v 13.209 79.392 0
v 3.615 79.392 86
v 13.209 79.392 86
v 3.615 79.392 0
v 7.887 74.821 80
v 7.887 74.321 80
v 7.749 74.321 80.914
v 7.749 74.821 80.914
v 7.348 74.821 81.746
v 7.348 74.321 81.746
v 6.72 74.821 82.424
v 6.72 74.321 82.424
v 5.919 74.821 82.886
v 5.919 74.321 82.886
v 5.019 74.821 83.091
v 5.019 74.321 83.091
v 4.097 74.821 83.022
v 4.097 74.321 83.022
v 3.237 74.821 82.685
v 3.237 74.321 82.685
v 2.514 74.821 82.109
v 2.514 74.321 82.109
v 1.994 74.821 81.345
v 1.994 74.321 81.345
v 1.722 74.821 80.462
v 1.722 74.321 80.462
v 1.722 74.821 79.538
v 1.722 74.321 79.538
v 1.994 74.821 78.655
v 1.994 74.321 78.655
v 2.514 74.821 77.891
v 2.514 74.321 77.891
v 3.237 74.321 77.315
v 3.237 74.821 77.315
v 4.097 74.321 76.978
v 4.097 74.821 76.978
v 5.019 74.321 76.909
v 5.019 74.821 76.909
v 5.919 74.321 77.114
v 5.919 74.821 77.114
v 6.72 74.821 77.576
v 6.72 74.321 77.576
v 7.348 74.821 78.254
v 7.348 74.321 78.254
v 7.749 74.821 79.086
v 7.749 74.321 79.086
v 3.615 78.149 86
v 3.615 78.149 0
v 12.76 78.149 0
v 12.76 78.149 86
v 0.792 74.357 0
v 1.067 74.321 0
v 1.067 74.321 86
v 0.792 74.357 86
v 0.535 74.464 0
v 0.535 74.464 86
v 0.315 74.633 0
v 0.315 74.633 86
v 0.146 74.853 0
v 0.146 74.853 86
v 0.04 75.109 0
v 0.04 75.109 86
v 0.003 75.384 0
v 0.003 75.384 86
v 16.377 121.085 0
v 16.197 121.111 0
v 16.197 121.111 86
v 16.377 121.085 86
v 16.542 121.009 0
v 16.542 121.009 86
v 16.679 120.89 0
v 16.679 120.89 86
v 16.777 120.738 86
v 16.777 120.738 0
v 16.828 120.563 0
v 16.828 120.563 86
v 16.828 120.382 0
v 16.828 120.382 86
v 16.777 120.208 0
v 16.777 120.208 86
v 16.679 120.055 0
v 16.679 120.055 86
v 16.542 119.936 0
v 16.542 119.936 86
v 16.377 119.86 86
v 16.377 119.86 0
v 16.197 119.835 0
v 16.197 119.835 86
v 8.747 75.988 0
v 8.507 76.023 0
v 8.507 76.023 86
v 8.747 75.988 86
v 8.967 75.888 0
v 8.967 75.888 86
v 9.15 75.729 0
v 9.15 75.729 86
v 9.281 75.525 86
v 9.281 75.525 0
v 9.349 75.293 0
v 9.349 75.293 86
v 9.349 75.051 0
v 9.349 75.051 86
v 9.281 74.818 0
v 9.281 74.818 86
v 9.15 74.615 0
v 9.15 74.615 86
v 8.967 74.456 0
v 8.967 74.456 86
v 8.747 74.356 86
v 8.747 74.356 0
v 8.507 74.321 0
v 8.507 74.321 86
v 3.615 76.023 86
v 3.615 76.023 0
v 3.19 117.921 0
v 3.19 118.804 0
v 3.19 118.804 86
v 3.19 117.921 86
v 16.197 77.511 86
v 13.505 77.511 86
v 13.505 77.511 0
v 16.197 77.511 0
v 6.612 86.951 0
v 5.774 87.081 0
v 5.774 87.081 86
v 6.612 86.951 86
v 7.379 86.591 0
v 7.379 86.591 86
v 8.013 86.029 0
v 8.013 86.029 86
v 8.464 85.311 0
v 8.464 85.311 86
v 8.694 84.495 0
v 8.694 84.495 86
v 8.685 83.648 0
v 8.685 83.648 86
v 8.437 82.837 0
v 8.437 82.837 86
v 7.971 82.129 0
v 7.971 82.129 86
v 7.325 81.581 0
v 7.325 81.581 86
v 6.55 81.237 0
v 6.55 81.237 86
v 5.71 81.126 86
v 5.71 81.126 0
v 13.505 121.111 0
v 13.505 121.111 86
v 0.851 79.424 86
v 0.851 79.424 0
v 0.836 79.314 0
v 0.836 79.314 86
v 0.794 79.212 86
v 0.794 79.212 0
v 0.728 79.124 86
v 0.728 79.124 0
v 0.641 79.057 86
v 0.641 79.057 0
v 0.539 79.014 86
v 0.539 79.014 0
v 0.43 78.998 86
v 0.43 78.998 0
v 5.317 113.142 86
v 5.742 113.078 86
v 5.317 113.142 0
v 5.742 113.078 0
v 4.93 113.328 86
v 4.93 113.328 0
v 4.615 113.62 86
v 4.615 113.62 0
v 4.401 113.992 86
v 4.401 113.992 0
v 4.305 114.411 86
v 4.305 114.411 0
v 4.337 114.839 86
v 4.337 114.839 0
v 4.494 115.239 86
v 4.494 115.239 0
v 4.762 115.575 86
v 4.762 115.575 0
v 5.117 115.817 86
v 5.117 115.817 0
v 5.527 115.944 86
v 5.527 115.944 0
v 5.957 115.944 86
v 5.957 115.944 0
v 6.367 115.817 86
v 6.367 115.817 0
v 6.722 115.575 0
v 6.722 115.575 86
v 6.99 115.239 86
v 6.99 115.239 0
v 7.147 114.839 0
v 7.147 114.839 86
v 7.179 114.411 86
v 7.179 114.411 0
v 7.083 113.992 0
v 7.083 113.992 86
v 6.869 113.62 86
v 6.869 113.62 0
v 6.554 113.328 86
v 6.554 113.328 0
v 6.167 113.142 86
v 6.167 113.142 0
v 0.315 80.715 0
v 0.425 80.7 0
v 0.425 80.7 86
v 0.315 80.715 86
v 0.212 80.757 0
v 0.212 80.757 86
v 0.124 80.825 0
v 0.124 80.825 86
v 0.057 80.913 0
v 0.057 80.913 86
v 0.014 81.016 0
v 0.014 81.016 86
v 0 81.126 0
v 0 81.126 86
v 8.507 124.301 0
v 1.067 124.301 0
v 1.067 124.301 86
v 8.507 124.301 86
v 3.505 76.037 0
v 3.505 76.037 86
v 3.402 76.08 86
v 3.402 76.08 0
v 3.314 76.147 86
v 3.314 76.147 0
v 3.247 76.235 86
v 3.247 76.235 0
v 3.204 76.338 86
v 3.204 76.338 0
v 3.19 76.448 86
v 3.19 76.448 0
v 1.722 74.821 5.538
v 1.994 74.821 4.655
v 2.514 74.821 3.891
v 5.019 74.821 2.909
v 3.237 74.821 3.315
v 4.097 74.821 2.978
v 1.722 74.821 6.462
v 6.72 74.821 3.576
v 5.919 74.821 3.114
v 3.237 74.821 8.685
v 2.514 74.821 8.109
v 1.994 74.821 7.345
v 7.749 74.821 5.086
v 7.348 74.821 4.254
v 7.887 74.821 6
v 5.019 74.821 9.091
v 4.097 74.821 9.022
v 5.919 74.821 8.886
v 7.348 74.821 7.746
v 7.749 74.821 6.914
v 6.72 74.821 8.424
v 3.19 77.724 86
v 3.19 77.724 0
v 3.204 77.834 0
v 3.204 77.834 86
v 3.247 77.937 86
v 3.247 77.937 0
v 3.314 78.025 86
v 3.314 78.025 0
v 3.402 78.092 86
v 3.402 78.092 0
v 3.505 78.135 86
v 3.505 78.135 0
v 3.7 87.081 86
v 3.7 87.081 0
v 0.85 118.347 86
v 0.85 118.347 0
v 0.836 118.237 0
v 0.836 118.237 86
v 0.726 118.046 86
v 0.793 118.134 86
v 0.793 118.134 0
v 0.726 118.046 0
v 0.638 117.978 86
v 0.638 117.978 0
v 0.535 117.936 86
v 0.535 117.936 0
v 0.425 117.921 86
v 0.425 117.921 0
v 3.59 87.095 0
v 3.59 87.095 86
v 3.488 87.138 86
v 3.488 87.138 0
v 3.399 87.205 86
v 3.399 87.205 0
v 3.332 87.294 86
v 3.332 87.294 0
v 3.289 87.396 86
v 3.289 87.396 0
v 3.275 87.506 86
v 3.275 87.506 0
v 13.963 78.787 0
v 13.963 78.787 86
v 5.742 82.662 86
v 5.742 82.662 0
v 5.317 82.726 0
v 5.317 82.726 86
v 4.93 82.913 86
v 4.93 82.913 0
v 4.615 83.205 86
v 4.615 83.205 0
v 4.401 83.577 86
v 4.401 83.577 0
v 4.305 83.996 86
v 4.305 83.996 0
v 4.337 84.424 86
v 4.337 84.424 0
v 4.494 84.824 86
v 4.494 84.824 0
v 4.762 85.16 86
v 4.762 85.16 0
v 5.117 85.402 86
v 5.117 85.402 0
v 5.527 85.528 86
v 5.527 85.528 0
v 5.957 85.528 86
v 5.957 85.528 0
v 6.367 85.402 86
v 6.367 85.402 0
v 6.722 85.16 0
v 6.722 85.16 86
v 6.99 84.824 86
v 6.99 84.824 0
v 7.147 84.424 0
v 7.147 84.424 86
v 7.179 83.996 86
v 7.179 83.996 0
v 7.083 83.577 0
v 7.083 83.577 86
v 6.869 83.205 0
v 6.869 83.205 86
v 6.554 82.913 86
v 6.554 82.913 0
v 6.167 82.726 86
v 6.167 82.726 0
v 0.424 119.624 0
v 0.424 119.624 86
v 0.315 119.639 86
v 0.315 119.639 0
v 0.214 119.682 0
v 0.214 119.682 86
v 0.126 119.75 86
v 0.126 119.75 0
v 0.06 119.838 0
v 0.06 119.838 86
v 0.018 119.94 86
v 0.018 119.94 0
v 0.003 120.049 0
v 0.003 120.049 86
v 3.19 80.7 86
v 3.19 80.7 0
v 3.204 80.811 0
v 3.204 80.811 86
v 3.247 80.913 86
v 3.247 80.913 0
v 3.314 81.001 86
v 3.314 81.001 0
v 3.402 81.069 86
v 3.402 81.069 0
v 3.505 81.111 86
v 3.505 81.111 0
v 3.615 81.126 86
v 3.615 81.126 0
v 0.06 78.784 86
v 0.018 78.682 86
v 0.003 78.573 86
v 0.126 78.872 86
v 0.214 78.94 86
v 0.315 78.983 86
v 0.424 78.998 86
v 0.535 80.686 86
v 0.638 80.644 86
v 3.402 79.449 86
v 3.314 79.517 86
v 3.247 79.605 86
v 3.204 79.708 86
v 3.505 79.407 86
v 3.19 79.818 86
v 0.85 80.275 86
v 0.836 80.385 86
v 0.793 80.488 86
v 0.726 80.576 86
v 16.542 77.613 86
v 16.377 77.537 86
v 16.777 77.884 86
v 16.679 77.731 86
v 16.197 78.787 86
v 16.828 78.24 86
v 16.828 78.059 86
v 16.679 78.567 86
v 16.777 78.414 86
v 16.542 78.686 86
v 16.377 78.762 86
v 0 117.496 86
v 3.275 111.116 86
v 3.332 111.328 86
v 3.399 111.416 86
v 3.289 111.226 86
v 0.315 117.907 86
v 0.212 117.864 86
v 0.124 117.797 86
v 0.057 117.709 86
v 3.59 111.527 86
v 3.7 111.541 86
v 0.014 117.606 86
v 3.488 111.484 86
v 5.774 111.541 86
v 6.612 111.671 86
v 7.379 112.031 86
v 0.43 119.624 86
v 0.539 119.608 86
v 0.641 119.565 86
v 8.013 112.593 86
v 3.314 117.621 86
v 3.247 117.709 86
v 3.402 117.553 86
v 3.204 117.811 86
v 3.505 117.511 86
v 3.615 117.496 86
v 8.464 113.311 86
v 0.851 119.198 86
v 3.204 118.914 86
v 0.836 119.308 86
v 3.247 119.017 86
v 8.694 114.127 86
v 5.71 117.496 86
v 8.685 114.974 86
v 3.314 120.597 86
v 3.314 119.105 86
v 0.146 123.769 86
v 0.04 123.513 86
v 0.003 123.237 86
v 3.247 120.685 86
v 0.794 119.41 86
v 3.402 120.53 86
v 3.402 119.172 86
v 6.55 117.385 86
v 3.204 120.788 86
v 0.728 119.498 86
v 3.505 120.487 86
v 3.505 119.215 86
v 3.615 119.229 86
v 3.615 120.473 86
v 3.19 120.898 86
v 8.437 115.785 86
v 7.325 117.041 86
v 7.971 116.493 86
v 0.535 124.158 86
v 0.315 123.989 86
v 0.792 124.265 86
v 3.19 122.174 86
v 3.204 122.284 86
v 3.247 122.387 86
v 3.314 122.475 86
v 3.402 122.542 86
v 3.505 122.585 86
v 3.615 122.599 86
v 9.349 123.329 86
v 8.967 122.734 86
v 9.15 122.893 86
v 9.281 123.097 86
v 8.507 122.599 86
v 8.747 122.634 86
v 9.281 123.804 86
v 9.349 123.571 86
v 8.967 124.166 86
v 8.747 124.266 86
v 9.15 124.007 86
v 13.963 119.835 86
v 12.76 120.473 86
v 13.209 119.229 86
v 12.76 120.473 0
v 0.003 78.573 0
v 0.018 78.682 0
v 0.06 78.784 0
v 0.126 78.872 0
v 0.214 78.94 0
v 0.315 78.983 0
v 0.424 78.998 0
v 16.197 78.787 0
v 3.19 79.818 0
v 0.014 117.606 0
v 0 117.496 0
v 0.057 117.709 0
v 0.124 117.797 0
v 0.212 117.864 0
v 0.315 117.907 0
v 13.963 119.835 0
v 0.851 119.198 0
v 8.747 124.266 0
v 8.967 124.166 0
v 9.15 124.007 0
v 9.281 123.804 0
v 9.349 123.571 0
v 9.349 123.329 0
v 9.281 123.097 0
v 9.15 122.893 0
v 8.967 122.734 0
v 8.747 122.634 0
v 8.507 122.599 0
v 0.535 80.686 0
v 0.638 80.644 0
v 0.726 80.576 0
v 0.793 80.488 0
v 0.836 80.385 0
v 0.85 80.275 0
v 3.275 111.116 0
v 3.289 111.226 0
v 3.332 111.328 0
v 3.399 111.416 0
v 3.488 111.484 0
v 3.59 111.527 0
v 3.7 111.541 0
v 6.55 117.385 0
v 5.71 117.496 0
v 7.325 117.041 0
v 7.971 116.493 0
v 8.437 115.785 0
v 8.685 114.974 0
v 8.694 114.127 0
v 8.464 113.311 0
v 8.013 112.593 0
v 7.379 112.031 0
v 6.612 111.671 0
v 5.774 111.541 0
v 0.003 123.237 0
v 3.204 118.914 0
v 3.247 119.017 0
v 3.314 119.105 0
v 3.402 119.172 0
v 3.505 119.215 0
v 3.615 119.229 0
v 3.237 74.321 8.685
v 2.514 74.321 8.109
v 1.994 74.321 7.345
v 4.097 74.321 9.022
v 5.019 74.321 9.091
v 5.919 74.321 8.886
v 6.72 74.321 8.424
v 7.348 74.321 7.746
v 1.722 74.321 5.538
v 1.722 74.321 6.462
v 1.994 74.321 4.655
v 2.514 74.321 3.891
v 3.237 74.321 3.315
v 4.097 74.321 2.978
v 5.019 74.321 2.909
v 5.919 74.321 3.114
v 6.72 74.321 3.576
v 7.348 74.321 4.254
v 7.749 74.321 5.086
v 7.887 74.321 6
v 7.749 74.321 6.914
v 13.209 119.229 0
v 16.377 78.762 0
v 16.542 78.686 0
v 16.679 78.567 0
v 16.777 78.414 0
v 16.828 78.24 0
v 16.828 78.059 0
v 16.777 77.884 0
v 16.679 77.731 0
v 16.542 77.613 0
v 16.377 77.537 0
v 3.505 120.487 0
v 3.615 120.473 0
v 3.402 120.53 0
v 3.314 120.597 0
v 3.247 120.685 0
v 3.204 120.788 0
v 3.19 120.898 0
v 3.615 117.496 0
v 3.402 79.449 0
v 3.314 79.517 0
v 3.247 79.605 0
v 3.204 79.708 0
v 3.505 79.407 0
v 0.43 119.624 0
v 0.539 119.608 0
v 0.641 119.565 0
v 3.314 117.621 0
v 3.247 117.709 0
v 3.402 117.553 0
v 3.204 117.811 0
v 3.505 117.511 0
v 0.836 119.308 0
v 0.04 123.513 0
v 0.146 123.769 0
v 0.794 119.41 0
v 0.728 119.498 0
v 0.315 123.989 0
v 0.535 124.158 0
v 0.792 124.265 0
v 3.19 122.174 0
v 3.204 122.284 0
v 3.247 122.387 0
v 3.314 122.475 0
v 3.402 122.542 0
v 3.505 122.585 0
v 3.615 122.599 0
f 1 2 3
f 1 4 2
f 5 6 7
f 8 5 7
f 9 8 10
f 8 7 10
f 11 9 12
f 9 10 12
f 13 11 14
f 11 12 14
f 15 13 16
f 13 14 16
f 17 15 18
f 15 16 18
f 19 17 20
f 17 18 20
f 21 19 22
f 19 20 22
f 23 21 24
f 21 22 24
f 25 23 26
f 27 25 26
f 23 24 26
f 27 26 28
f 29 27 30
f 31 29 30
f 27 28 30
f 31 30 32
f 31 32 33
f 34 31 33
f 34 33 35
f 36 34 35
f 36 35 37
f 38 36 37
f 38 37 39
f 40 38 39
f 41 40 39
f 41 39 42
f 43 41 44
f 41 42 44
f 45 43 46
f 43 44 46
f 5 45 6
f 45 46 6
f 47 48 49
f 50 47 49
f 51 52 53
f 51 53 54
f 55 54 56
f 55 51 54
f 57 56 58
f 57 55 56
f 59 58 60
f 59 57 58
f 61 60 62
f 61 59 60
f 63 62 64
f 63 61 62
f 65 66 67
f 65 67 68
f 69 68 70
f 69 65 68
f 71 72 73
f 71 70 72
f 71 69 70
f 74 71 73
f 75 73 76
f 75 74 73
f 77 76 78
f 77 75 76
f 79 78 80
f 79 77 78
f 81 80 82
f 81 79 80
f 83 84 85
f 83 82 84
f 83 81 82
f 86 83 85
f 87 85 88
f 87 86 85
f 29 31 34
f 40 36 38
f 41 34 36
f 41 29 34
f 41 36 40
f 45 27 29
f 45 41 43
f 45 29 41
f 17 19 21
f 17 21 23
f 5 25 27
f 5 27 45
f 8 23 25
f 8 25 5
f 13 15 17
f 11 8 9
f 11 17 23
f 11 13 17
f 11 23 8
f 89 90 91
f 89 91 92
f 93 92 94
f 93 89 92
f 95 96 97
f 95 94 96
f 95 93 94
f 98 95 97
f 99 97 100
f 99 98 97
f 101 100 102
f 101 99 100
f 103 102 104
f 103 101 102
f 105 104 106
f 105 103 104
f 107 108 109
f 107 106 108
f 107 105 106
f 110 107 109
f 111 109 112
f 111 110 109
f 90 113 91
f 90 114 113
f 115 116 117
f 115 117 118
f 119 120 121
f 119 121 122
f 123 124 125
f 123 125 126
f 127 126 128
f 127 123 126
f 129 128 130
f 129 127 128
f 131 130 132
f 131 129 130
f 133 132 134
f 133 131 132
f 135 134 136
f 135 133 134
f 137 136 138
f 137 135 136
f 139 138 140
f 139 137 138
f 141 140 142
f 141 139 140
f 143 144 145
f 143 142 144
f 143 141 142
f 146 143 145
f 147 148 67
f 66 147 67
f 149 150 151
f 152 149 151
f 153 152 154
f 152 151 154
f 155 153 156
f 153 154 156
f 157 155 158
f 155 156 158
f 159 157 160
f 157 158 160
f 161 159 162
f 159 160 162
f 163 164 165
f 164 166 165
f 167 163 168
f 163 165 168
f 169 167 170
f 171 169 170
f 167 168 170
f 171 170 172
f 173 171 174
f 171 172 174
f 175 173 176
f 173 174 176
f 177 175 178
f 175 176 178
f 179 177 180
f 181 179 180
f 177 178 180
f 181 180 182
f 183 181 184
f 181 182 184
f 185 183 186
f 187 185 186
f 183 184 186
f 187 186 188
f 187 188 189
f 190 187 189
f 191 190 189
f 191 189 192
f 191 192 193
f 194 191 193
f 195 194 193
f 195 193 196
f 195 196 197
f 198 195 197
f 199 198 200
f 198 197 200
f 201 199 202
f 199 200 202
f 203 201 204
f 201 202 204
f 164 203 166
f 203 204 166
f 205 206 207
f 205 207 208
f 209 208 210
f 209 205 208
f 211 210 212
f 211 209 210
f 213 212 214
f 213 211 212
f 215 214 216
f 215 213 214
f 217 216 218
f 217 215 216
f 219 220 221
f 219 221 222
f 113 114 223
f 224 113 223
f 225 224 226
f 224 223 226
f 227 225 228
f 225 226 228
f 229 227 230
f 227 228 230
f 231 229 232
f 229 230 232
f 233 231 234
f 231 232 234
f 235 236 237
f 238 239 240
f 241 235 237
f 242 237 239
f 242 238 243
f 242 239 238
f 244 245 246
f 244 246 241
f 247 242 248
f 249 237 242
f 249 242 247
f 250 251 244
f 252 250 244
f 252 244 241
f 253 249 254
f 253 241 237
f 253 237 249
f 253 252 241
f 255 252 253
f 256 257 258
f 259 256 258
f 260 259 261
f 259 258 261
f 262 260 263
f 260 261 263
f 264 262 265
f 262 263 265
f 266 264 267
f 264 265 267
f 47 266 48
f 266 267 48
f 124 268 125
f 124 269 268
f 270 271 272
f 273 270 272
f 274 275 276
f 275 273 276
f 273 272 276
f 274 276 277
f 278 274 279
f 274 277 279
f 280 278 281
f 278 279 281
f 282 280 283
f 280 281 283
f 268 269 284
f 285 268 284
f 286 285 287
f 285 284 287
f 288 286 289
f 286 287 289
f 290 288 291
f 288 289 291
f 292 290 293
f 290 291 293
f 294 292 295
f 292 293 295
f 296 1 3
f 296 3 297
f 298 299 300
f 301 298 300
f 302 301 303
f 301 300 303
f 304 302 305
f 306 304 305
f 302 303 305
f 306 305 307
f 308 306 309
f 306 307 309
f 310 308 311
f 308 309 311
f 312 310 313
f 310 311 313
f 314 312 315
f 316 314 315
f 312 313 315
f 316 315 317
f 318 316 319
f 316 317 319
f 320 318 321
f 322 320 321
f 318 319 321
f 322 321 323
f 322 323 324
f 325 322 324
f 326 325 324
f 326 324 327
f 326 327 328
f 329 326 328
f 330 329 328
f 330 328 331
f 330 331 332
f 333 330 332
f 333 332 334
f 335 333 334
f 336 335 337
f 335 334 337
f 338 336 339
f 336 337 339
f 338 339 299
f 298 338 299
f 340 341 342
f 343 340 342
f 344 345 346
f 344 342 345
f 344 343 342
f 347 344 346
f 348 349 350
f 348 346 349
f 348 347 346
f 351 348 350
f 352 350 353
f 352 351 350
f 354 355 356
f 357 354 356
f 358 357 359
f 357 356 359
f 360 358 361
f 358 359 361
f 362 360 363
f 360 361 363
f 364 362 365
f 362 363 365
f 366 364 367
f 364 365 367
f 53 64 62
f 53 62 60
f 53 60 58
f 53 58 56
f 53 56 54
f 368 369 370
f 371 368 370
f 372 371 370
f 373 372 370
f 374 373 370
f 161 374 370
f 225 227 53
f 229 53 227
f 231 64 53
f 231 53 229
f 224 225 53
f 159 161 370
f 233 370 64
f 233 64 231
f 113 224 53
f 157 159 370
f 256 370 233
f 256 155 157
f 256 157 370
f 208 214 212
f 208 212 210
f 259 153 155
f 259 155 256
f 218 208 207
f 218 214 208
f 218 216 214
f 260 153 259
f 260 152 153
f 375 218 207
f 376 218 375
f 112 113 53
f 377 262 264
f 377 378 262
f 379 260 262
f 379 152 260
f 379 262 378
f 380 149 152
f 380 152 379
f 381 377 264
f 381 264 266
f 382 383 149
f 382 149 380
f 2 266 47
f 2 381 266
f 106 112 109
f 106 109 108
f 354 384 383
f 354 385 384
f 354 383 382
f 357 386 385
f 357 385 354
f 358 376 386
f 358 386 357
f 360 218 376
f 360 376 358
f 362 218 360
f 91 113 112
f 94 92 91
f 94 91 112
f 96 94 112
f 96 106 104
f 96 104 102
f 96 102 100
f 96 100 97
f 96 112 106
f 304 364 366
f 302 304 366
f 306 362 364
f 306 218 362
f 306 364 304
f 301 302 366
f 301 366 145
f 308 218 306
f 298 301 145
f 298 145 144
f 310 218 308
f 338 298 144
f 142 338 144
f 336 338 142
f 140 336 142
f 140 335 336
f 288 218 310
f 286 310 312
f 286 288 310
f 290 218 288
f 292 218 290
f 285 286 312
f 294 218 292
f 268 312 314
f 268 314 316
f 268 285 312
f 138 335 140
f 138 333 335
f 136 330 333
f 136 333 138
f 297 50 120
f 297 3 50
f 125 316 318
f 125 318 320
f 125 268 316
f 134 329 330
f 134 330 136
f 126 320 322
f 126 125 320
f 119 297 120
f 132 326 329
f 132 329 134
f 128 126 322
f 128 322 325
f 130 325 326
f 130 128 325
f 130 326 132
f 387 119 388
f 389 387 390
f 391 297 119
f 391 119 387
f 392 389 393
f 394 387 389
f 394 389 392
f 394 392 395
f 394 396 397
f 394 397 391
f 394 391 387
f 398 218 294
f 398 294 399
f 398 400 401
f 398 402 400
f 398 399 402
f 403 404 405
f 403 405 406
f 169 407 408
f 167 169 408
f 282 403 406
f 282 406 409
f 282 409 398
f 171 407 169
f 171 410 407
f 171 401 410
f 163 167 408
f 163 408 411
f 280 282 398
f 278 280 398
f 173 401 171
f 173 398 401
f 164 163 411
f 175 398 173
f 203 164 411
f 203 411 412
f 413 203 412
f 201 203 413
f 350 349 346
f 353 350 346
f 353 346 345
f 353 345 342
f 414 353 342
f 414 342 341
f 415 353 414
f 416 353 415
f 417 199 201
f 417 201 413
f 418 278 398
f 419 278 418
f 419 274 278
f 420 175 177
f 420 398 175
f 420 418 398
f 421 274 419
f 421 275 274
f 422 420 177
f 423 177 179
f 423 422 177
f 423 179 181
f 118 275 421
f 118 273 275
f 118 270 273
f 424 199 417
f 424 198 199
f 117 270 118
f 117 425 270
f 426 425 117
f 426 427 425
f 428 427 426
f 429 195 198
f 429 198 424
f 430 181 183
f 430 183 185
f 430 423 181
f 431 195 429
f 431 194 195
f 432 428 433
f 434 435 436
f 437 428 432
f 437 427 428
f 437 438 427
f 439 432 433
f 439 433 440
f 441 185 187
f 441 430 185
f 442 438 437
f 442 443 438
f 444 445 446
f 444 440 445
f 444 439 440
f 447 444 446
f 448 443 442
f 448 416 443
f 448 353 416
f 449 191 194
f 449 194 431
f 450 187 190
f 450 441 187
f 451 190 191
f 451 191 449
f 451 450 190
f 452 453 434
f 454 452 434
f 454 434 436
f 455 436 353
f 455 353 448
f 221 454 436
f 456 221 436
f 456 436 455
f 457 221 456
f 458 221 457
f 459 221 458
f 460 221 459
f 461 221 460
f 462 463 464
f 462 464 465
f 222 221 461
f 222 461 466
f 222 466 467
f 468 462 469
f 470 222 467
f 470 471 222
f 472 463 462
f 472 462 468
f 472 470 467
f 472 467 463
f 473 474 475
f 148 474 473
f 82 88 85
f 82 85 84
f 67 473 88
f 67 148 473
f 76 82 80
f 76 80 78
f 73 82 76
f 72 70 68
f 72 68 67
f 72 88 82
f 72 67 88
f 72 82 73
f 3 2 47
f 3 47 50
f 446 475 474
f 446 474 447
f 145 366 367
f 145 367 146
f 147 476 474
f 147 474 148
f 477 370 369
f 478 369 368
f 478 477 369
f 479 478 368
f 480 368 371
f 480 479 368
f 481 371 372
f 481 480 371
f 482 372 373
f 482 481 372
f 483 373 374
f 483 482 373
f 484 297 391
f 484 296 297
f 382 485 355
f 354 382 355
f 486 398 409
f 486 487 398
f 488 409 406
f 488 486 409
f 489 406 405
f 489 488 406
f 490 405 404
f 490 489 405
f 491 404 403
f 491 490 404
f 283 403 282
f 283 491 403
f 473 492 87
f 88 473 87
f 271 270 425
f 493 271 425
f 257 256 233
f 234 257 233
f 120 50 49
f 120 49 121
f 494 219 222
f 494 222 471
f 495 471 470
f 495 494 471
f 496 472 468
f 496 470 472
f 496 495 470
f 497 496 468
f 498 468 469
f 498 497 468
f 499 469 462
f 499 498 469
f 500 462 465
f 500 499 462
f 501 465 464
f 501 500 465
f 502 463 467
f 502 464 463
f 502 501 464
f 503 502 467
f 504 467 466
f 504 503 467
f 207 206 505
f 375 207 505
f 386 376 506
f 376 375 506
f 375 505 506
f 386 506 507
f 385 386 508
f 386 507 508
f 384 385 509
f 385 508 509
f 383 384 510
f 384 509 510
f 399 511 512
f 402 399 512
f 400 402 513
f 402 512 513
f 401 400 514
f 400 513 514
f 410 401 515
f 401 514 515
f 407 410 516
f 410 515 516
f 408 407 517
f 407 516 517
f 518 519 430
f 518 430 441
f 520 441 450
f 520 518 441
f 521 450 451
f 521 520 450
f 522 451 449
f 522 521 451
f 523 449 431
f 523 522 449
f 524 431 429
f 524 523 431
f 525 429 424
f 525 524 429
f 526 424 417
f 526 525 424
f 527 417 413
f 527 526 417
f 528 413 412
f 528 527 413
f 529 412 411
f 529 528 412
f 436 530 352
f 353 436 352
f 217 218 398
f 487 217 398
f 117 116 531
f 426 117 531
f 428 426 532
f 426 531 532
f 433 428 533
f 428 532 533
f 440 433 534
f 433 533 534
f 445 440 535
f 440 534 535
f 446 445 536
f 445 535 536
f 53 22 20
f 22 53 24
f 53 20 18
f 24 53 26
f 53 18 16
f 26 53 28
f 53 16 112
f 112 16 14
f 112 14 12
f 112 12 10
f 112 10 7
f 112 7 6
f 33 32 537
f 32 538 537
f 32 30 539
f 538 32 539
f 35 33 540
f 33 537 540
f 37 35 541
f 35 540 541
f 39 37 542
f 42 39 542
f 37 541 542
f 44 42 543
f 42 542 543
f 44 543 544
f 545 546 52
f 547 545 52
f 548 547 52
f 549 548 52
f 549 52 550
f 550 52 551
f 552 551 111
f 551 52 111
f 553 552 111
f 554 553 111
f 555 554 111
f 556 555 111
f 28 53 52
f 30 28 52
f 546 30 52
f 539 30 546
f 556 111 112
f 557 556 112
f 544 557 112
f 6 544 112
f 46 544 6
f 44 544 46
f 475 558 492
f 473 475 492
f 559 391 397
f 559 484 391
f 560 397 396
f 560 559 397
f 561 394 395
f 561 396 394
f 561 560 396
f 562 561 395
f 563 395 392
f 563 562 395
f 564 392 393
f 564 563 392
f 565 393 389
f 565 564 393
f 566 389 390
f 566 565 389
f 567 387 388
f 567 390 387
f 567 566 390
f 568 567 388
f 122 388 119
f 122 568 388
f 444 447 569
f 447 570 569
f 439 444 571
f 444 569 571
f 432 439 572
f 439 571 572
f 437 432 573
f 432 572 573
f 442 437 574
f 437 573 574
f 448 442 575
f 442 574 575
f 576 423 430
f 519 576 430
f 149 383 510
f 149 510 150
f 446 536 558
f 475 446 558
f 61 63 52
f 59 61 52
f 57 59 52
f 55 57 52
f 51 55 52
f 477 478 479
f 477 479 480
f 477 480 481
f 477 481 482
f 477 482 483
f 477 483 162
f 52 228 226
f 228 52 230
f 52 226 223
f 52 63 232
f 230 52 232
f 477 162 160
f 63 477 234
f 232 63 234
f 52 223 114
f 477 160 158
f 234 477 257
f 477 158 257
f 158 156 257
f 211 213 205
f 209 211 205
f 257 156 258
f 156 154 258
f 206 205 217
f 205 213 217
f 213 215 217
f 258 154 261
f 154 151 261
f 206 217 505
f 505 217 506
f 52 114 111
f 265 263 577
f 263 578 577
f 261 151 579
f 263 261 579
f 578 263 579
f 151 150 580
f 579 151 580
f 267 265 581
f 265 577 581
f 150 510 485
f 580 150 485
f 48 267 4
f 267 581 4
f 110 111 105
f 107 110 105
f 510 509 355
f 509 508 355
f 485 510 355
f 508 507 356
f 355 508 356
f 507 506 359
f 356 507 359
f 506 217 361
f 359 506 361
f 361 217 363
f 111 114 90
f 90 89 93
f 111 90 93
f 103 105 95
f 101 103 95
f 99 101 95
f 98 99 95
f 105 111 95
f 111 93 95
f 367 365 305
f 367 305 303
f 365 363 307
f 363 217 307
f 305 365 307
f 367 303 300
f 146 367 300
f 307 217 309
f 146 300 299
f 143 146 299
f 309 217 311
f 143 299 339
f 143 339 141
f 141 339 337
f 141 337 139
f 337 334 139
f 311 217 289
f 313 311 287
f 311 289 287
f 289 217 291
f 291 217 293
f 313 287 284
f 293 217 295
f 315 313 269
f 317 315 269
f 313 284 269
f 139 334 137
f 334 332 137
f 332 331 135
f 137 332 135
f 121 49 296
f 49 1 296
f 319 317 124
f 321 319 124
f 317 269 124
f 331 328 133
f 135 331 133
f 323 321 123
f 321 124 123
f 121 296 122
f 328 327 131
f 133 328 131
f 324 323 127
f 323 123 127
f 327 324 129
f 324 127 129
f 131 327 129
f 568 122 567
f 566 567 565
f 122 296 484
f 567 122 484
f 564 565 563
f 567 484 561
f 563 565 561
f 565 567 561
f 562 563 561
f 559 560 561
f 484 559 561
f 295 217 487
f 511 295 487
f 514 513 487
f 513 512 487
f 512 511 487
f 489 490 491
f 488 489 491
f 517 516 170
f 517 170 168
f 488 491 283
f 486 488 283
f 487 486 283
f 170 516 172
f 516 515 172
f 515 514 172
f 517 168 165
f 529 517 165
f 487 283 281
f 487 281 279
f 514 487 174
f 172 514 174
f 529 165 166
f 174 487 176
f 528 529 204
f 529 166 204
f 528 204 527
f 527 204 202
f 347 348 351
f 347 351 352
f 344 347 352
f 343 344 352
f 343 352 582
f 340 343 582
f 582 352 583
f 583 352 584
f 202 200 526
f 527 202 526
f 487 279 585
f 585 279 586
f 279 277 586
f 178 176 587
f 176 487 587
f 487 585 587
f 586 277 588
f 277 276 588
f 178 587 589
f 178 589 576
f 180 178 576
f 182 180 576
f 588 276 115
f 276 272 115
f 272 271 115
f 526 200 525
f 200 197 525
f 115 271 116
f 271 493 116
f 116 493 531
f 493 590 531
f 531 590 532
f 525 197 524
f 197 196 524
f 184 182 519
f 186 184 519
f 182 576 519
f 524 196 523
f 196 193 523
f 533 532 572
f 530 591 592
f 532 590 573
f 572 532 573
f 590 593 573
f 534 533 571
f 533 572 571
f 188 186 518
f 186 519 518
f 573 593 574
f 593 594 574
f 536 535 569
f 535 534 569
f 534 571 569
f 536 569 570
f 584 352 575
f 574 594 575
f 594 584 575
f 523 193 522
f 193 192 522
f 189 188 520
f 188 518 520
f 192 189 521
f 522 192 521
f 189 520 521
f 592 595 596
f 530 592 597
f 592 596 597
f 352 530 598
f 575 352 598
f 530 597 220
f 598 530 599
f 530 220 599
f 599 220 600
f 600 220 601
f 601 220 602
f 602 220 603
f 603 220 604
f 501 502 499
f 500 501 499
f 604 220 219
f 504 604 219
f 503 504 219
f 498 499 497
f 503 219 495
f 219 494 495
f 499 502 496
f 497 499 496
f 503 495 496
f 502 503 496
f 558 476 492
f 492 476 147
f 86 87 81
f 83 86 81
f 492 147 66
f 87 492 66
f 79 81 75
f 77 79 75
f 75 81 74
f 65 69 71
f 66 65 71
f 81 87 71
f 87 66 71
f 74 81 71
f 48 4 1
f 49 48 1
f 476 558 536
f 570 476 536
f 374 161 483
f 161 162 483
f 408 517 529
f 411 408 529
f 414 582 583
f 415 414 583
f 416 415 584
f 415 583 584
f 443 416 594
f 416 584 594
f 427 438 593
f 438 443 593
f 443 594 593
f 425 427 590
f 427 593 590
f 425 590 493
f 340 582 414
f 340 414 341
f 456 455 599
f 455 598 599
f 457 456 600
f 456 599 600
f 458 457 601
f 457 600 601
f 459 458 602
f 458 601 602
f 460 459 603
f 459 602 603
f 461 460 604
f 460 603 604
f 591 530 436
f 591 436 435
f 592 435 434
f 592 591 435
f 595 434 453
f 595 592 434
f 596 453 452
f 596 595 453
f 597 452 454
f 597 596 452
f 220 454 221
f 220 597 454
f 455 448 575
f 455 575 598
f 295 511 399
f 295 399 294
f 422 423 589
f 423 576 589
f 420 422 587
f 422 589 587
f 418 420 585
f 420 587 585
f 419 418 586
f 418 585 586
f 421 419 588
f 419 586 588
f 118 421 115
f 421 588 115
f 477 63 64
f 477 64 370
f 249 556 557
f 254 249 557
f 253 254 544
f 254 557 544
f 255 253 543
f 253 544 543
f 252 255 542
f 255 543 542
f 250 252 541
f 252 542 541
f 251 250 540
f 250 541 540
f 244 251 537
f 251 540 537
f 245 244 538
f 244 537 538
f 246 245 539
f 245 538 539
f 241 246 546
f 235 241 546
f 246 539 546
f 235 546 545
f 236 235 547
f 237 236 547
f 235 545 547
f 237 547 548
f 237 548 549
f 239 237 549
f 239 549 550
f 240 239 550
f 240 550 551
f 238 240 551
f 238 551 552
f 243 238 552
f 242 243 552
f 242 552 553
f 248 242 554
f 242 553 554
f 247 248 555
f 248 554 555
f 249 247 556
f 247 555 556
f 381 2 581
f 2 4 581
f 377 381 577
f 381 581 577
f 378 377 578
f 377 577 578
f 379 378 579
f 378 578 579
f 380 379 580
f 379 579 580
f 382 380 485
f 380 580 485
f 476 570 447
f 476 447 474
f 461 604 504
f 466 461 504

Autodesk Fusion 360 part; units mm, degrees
sketch "Sketch1" plane through (0, 0, 0) normal (0, 0, 1) x (1, 0, 0)
  line L0 (36.0187, 148.7477) -> (36.0366, 148.794)
  line L1 (65.6521, 184) -> (76.1579, 184)
  line L2 (14.9996, 189) -> (14.9996, 194.9997)
  line L3 (-0.0194, 154.2247) -> (-0.0004, 154.2001)
  line L4 (-0.0302, 138.7537) -> (-0.0004, 138.7058)
  line L5 (-0.0004, 81.3672) -> (-0.0021, 81.3657)
  line L6 (15.3997, 143.0047) -> (15.3997, 102.5015)
  line L7 (-0.0004, 173.0047) -> (-0.0004, 102.5015)
  line L8 (2.0223, 183.0092) -> (1.9964, 183.0092)
  line L9 (1.9996, 175.0047) -> (2.0001, 175.0047)
  line L10 (4.0001, 177.0042) -> (4.0009, 181.0087)
  line L11 (0.0178, 200) -> (0.0178, 185.0092)
  arc A0 (0.0178, 185.0092) -> (2.0223, 183.0092) centre (2.0178, 185.0092) ccw
  arc A1 (4.0009, 181.0087) -> (1.9964, 183.0092) centre (2.0009, 181.0092) ccw
  line L12 (16.9996, 196.9997) -> (40, 196.9997)
  arc A2 (16.9996, 196.9997) -> (14.9996, 194.9997) centre (16.9996, 194.9997) ccw
  line L13 (16.9996, 187) -> (60, 187)
  arc A3 (14.9996, 189) -> (16.9996, 187) centre (16.9996, 189) ccw
  line L14 (63.5, 190) -> (76.1579, 190)
  line L15 (14.9996, 179.1547) -> (14.9996, 175.0047)
  arc A4 (16.9996, 181.1547) -> (14.9996, 179.1547) centre (16.9996, 179.1547) ccw
  line L16 (16.9996, 173.0047) -> (26.8487, 173.0047)
  arc A5 (14.9996, 175.0047) -> (16.9996, 173.0047) centre (16.9996, 175.0047) ccw
  arc A6 (2.0001, 175.0047) -> (4.0001, 177.0042) centre (2.0001, 177.0047) ccw
  arc A7 (1.9996, 175.0047) -> (-0.0004, 173.0047) centre (1.9996, 173.0047) ccw
  arc A8 (76.1579, 184) -> (76.1579, 190) centre (76.1579, 187) ccw
  line L17 (60, 187) -> (63.5, 190)
  line L18 (62.1079, 181.1547) -> (65.6521, 184)
  line L19 (17.3997, 145.0047) -> (27.1505, 145.0047)
  line L20 (27.4996, 145.0047) -> (27.5723, 145.0156)
  arc A9 (17.3997, 145.0047) -> (15.3997, 143.0047) centre (17.3997, 143.0047) ccw
  arc A10 (27.1505, 145.0047) -> (26.8487, 173.0047) centre (26.9996, 159.0047) ccw
  line L21 (-0.0004, 123.6359) -> (-0.0021, 123.6374)
  line L22 (5.0178, 205) -> (40, 205)
  arc A11 (5.0178, 205) -> (0.0178, 200) centre (5.0178, 200) ccw
  arc A12 (40, 196.9997) -> (40, 205) centre (40, 200.9999) ccw
  line L23 (16.9996, 181.1547) -> (62.1079, 181.1547)
  line L24 (27.4996, 29.9953) -> (27.5723, 29.9844)
  line L25 (16.9996, 1.9953) -> (26.8487, 1.9953)
  line L26 (16.9996, -12) -> (60, -12)
  line L27 (2.0223, -8.0092) -> (1.9964, -8.0092)
  line L28 (65.6521, -9) -> (76.1579, -9)
  arc A13 (1.9964, -8.0092) -> (4.0009, -6.0087) centre (2.0009, -6.0092) ccw
  line L29 (16.9996, -21.9997) -> (40, -21.9997)
  line L30 (1.9996, -0.0047) -> (2.0001, -0.0047)
  arc A14 (15.3997, 31.9953) -> (17.3997, 29.9953) centre (17.3997, 31.9953) ccw
  line L31 (36.0187, 26.2523) -> (36.0366, 26.206)
  arc A15 (0.0178, -25) -> (5.0178, -30) centre (5.0178, -25) ccw
  arc A16 (26.8487, 1.9953) -> (27.1505, 29.9953) centre (26.9996, 15.9953) ccw
  line L32 (4.0001, -2.0042) -> (4.0009, -6.0087)
  arc A17 (2.0223, -8.0092) -> (0.0178, -10.0092) centre (2.0178, -10.0092) ccw
  line L33 (16.9996, -6.1547) -> (62.1079, -6.1547)
  line L34 (5.0178, -30) -> (40, -30)
  arc A18 (16.9996, -12) -> (14.9996, -14) centre (16.9996, -14) ccw
  line L35 (14.9996, -4.1547) -> (14.9996, -0.0047)
  line L36 (63.5, -15) -> (76.1579, -15)
  arc A19 (40, -30) -> (40, -21.9997) centre (40, -25.9999) ccw
  arc A20 (76.1579, -15) -> (76.1579, -9) centre (76.1579, -12) ccw
  arc A21 (14.9996, -19.9997) -> (16.9996, -21.9997) centre (16.9996, -19.9997) ccw
  arc A22 (4.0001, -2.0042) -> (2.0001, -0.0047) centre (2.0001, -2.0047) ccw
  line L37 (-0.0004, 51.3641) -> (-0.0021, 51.3626)
  line L38 (17.3997, 29.9953) -> (27.1505, 29.9953)
  line L39 (60, -12) -> (63.5, -15)
  line L40 (-0.0004, 1.9953) -> (-0.0004, 72.4985)
  line L41 (0.0178, -25) -> (0.0178, -10.0092)
  line L42 (-0.0194, 20.7753) -> (-0.0004, 20.7999)
  line L43 (14.9996, -14) -> (14.9996, -19.9997)
  arc A23 (16.9996, 1.9953) -> (14.9996, -0.0047) centre (16.9996, -0.0047) ccw
  line L44 (62.1079, -6.1547) -> (65.6521, -9)
  line L45 (-0.0302, 36.2463) -> (-0.0004, 36.2942)
  arc A24 (-0.0004, 1.9953) -> (1.9996, -0.0047) centre (1.9996, 1.9953) ccw
  arc A25 (14.9996, -4.1547) -> (16.9996, -6.1547) centre (16.9996, -4.1547) ccw
  line L46 (15.3997, 31.9953) -> (15.3997, 72.4985)
  line L47 (-0.0004, 102.5015) -> (-0.0004, 72.4985)
  line L48 (15.3997, 102.5015) -> (15.3997, 72.4985)
  circle A26 centre (26.9996, 15.9953) radius 6.7755
  circle A27 centre (26.9996, 159.0047) radius 6.7755
  dimension "d8" = 2
  dimension "d9" = 2
  dimension "d11" = 2
  dimension "d13" = 2
  dimension "d18" = 2
  dimension "d19" = 2
  dimension "d27" = 2
  dimension "d28" = 2
  dimension "d34" = 3
  dimension "d35" = 2
  dimension "d40" = 5
  dimension "d41" = 4.0002
  dimension "d52" = 14.0008
  dimension "d55" = 235
  dimension "d57" = 14.0008
  dimension "d59" = 13.551
  dimension "d61" = 45.9953
  dimension "d62" = 45.9953
  dimension "d63" = 27
  dimension "d64" = 27
  dimension "d65" = 13.551
extrude "Extrude4" add sketch "Sketch1" along normal blind 404.3634 contours L1 L2 L6 L7 L8 L10 L11 A0 A1 L12 A2 L13 A3 L14 L15 A4 L16 A5 A6 A7 A8 L17 L18 L19 A9 A10 L22 A11 A12 L23 L25 L26 L27 L28 A13 L29 A14 A15 A16 L32 A17 L33 L34 A18 L35 L36 A19 A20 A21 A22 L38 L39 L40 L41 L43 A23 L44 A24 A25 L46 L47 L48 | A26 | A27
sketch "Sketch2" plane through (0, 0, 404.3634) normal (0, 0, 1) x (-1, 0, 0)
  line L0 (-17.3997, -145.0047) -> (-27.1505, -145.0047)
  arc A0 (-27.1505, -145.0047) -> (-26.8487, -173.0047) centre (-26.9996, -159.0047) ccw
  line L1 (-26.8487, -173.0047) -> (-16.9996, -173.0047)
  arc A1 (-14.9996, -175.0047) -> (-16.9996, -173.0047) centre (-16.9996, -175.0047) ccw
  line L2 (-14.9996, -175.0047) -> (-14.9996, -179.1547)
  arc A2 (-16.9996, -181.1547) -> (-14.9996, -179.1547) centre (-16.9996, -179.1547) ccw
  line L3 (-16.9996, -181.1547) -> (-62.1079, -181.1547)
  line L4 (-62.1079, -181.1547) -> (-65.6521, -184)
  line L5 (-65.6521, -184) -> (-76.1579, -184)
  arc A3 (-76.1579, -184) -> (-76.1579, -190) centre (-76.1579, -187) ccw
  line L6 (-76.1579, -190) -> (-63.5, -190)
  line L7 (-63.5, -190) -> (-60, -187)
  line L8 (-60, -187) -> (-16.9996, -187)
  arc A4 (-14.9996, -189) -> (-16.9996, -187) centre (-16.9996, -189) ccw
  line L9 (-14.9996, -189) -> (-14.9996, -194.9997)
  arc A5 (-16.9996, -196.9997) -> (-14.9996, -194.9997) centre (-16.9996, -194.9997) ccw
  line L10 (-16.9996, -196.9997) -> (-40, -196.9997)
  arc A6 (-40, -196.9997) -> (-40, -205) centre (-40, -200.9999) ccw
  line L11 (-40, -205) -> (-5.0178, -205)
  arc A7 (-5.0178, -205) -> (-0.0178, -200) centre (-5.0178, -200) ccw
  line L12 (-0.0178, -200) -> (-0.0178, -185.0092)
  arc A8 (-0.0178, -185.0092) -> (-2.0223, -183.0092) centre (-2.0178, -185.0092) ccw
  line L13 (-2.0223, -183.0092) -> (-1.9964, -183.0092)
  arc A9 (-4.0009, -181.0087) -> (-1.9964, -183.0092) centre (-2.0009, -181.0092) ccw
  line L14 (-4.0009, -181.0087) -> (-4.0001, -177.0042)
  arc A10 (-2.0001, -175.0047) -> (-4.0001, -177.0042) centre (-2.0001, -177.0047) ccw
  line L15 (-2.0001, -175.0047) -> (-1.9996, -175.0047)
  arc A11 (-1.9996, -175.0047) -> (0.0004, -173.0047) centre (-1.9996, -173.0047) ccw
  line L16 (0.0004, -173.0047) -> (0.0004, -102.5015)
  line L17 (0.0004, -102.5015) -> (0.0004, -72.4985)
  line L18 (0.0004, -72.4985) -> (0.0004, -1.9953)
  arc A12 (0.0004, -1.9953) -> (-1.9996, 0.0047) centre (-1.9996, -1.9953) ccw
  line L19 (-1.9996, 0.0047) -> (-2.0001, 0.0047)
  arc A13 (-4.0001, 2.0042) -> (-2.0001, 0.0047) centre (-2.0001, 2.0047) ccw
  line L20 (-4.0001, 2.0042) -> (-4.0009, 6.0087)
  arc A14 (-1.9964, 8.0092) -> (-4.0009, 6.0087) centre (-2.0009, 6.0092) ccw
  line L21 (-1.9964, 8.0092) -> (-2.0223, 8.0092)
  arc A15 (-2.0223, 8.0092) -> (-0.0178, 10.0092) centre (-2.0178, 10.0092) ccw
  line L22 (-0.0178, 10.0092) -> (-0.0178, 25)
  arc A16 (-0.0178, 25) -> (-5.0178, 30) centre (-5.0178, 25) ccw
  line L23 (-5.0178, 30) -> (-40, 30)
  arc A17 (-40, 30) -> (-40, 21.9997) centre (-40, 25.9999) ccw
  line L24 (-40, 21.9997) -> (-16.9996, 21.9997)
  arc A18 (-14.9996, 19.9997) -> (-16.9996, 21.9997) centre (-16.9996, 19.9997) ccw
  line L25 (-14.9996, 19.9997) -> (-14.9996, 14)
  arc A19 (-16.9996, 12) -> (-14.9996, 14) centre (-16.9996, 14) ccw
  line L26 (-16.9996, 12) -> (-60, 12)
  line L27 (-60, 12) -> (-63.5, 15)
  line L28 (-63.5, 15) -> (-76.1579, 15)
  arc A20 (-76.1579, 15) -> (-76.1579, 9) centre (-76.1579, 12) ccw
  line L29 (-76.1579, 9) -> (-65.6521, 9)
  line L30 (-65.6521, 9) -> (-62.1079, 6.1547)
  line L31 (-62.1079, 6.1547) -> (-16.9996, 6.1547)
  arc A21 (-14.9996, 4.1547) -> (-16.9996, 6.1547) centre (-16.9996, 4.1547) ccw
  line L32 (-14.9996, 4.1547) -> (-14.9996, 0.0047)
  arc A22 (-16.9996, -1.9953) -> (-14.9996, 0.0047) centre (-16.9996, 0.0047) ccw
  line L33 (-16.9996, -1.9953) -> (-26.8487, -1.9953)
  arc A23 (-26.8487, -1.9953) -> (-27.1505, -29.9953) centre (-26.9996, -15.9953) ccw
  line L34 (-27.1505, -29.9953) -> (-17.3997, -29.9953)
  arc A24 (-15.3997, -31.9953) -> (-17.3997, -29.9953) centre (-17.3997, -31.9953) ccw
  line L35 (-15.3997, -31.9953) -> (-15.3997, -143.0047)
  arc A25 (-17.3997, -145.0047) -> (-15.3997, -143.0047) centre (-17.3997, -143.0047) ccw
  circle A26 centre (-26.9996, -15.9953) radius 6.7755
  circle A27 centre (-26.9996, -159.0047) radius 6.7755
  dimension "d66" = 13.551
  dimension "d67" = 13.551
hole "Hole1" at (26.9996, 159.0047, 404.3634) direction (0, 0, -1) diameter 13.551 end through all
sketch "Sketch3" plane through (0, 0, 404.3634) normal (0, 0, 1) x (-1, 0, 0)
  circle A0 centre (-26.9996, -159.0047) radius 6.7755
  line L0 (-17.3997, -145.0047) -> (-27.1505, -145.0047)
  arc A1 (-27.1505, -145.0047) -> (-26.8487, -173.0047) centre (-26.9996, -159.0047) ccw
  line L1 (-26.8487, -173.0047) -> (-16.9996, -173.0047)
  arc A2 (-14.9996, -175.0047) -> (-16.9996, -173.0047) centre (-16.9996, -175.0047) ccw
  line L2 (-14.9996, -175.0047) -> (-14.9996, -179.1547)
  arc A3 (-16.9996, -181.1547) -> (-14.9996, -179.1547) centre (-16.9996, -179.1547) ccw
  line L3 (-16.9996, -181.1547) -> (-62.1079, -181.1547)
  line L4 (-62.1079, -181.1547) -> (-65.6521, -184)
  line L5 (-65.6521, -184) -> (-76.1579, -184)
  arc A4 (-76.1579, -184) -> (-76.1579, -190) centre (-76.1579, -187) ccw
  line L6 (-76.1579, -190) -> (-63.5, -190)
  line L7 (-63.5, -190) -> (-60, -187)
  line L8 (-60, -187) -> (-16.9996, -187)
  arc A5 (-14.9996, -189) -> (-16.9996, -187) centre (-16.9996, -189) ccw
  line L9 (-14.9996, -189) -> (-14.9996, -194.9997)
  arc A6 (-16.9996, -196.9997) -> (-14.9996, -194.9997) centre (-16.9996, -194.9997) ccw
  line L10 (-16.9996, -196.9997) -> (-40, -196.9997)
  arc A7 (-40, -196.9997) -> (-40, -205) centre (-40, -200.9999) ccw
  line L11 (-40, -205) -> (-5.0178, -205)
  arc A8 (-5.0178, -205) -> (-0.0178, -200) centre (-5.0178, -200) ccw
  line L12 (-0.0178, -200) -> (-0.0178, -185.0092)
  arc A9 (-0.0178, -185.0092) -> (-2.0223, -183.0092) centre (-2.0178, -185.0092) ccw
  line L13 (-2.0223, -183.0092) -> (-1.9964, -183.0092)
  arc A10 (-4.0009, -181.0087) -> (-1.9964, -183.0092) centre (-2.0009, -181.0092) ccw
  line L14 (-4.0009, -181.0087) -> (-4.0001, -177.0042)
  arc A11 (-2.0001, -175.0047) -> (-4.0001, -177.0042) centre (-2.0001, -177.0047) ccw
  line L15 (-2.0001, -175.0047) -> (-1.9996, -175.0047)
  arc A12 (-1.9996, -175.0047) -> (0.0004, -173.0047) centre (-1.9996, -173.0047) ccw
  line L16 (0.0004, -173.0047) -> (0.0004, -102.5015)
  line L17 (0.0004, -102.5015) -> (0.0004, -72.4985)
  line L18 (0.0004, -72.4985) -> (0.0004, -1.9953)
  arc A13 (0.0004, -1.9953) -> (-1.9996, 0.0047) centre (-1.9996, -1.9953) ccw
  line L19 (-1.9996, 0.0047) -> (-2.0001, 0.0047)
  arc A14 (-4.0001, 2.0042) -> (-2.0001, 0.0047) centre (-2.0001, 2.0047) ccw
  line L20 (-4.0001, 2.0042) -> (-4.0009, 6.0087)
  arc A15 (-1.9964, 8.0092) -> (-4.0009, 6.0087) centre (-2.0009, 6.0092) ccw
  line L21 (-1.9964, 8.0092) -> (-2.0223, 8.0092)
  arc A16 (-2.0223, 8.0092) -> (-0.0178, 10.0092) centre (-2.0178, 10.0092) ccw
  line L22 (-0.0178, 10.0092) -> (-0.0178, 25)
  arc A17 (-0.0178, 25) -> (-5.0178, 30) centre (-5.0178, 25) ccw
  line L23 (-5.0178, 30) -> (-40, 30)
  arc A18 (-40, 30) -> (-40, 21.9997) centre (-40, 25.9999) ccw
  line L24 (-40, 21.9997) -> (-16.9996, 21.9997)
  arc A19 (-14.9996, 19.9997) -> (-16.9996, 21.9997) centre (-16.9996, 19.9997) ccw
  line L25 (-14.9996, 19.9997) -> (-14.9996, 14)
  arc A20 (-16.9996, 12) -> (-14.9996, 14) centre (-16.9996, 14) ccw
  line L26 (-16.9996, 12) -> (-60, 12)
  line L27 (-60, 12) -> (-63.5, 15)
  line L28 (-63.5, 15) -> (-76.1579, 15)
  arc A21 (-76.1579, 15) -> (-76.1579, 9) centre (-76.1579, 12) ccw
  line L29 (-76.1579, 9) -> (-65.6521, 9)
  line L30 (-65.6521, 9) -> (-62.1079, 6.1547)
  line L31 (-62.1079, 6.1547) -> (-16.9996, 6.1547)
  arc A22 (-14.9996, 4.1547) -> (-16.9996, 6.1547) centre (-16.9996, 4.1547) ccw
  line L32 (-14.9996, 4.1547) -> (-14.9996, 0.0047)
  arc A23 (-16.9996, -1.9953) -> (-14.9996, 0.0047) centre (-16.9996, 0.0047) ccw
  line L33 (-16.9996, -1.9953) -> (-26.8487, -1.9953)
  arc A24 (-26.8487, -1.9953) -> (-27.1505, -29.9953) centre (-26.9996, -15.9953) ccw
  line L34 (-27.1505, -29.9953) -> (-17.3997, -29.9953)
  arc A25 (-15.3997, -31.9953) -> (-17.3997, -29.9953) centre (-17.3997, -31.9953) ccw
  line L35 (-15.3997, -31.9953) -> (-15.3997, -143.0047)
  arc A26 (-17.3997, -145.0047) -> (-15.3997, -143.0047) centre (-17.3997, -143.0047) ccw
  circle A27 centre (-26.9996, -15.9953) radius 6.7755
  dimension "d70" = 13.551
hole "Hole2" at (26.9996, 15.9953, 404.3634) direction (0, 0, -1) diameter 13.551 end through all
scale "Scale3" factor 0.21268 about (-0.0004, 102.5015, 0) bodies 1
sketch "Sketch4" plane through (0, 74.3211, 0) normal (0, -1, 0) x (1, 0, 0)
  line L0 (1.0669, 0) -> (8.5069, 0)
  line L1 (8.5069, 0) -> (8.5069, 86)
  line L2 (8.5069, 86) -> (1.0669, 86)
  line L3 (1.0669, 86) -> (1.0669, 0)
  circle A0 centre (4.7869, 80) radius 3.1
  circle A1 centre (4.7869, 6) radius 3.1
  dimension "d73" = 6.2
  dimension "d74" = 7.44
  dimension "d75" = 3.72
  dimension "d76" = 6
  dimension "d77" = 6.2
  dimension "d78" = 3.72
  dimension "d79" = 6
extrude "Extrude5" cut sketch "Sketch4" against normal blind 0.5 contours A0 | A1
